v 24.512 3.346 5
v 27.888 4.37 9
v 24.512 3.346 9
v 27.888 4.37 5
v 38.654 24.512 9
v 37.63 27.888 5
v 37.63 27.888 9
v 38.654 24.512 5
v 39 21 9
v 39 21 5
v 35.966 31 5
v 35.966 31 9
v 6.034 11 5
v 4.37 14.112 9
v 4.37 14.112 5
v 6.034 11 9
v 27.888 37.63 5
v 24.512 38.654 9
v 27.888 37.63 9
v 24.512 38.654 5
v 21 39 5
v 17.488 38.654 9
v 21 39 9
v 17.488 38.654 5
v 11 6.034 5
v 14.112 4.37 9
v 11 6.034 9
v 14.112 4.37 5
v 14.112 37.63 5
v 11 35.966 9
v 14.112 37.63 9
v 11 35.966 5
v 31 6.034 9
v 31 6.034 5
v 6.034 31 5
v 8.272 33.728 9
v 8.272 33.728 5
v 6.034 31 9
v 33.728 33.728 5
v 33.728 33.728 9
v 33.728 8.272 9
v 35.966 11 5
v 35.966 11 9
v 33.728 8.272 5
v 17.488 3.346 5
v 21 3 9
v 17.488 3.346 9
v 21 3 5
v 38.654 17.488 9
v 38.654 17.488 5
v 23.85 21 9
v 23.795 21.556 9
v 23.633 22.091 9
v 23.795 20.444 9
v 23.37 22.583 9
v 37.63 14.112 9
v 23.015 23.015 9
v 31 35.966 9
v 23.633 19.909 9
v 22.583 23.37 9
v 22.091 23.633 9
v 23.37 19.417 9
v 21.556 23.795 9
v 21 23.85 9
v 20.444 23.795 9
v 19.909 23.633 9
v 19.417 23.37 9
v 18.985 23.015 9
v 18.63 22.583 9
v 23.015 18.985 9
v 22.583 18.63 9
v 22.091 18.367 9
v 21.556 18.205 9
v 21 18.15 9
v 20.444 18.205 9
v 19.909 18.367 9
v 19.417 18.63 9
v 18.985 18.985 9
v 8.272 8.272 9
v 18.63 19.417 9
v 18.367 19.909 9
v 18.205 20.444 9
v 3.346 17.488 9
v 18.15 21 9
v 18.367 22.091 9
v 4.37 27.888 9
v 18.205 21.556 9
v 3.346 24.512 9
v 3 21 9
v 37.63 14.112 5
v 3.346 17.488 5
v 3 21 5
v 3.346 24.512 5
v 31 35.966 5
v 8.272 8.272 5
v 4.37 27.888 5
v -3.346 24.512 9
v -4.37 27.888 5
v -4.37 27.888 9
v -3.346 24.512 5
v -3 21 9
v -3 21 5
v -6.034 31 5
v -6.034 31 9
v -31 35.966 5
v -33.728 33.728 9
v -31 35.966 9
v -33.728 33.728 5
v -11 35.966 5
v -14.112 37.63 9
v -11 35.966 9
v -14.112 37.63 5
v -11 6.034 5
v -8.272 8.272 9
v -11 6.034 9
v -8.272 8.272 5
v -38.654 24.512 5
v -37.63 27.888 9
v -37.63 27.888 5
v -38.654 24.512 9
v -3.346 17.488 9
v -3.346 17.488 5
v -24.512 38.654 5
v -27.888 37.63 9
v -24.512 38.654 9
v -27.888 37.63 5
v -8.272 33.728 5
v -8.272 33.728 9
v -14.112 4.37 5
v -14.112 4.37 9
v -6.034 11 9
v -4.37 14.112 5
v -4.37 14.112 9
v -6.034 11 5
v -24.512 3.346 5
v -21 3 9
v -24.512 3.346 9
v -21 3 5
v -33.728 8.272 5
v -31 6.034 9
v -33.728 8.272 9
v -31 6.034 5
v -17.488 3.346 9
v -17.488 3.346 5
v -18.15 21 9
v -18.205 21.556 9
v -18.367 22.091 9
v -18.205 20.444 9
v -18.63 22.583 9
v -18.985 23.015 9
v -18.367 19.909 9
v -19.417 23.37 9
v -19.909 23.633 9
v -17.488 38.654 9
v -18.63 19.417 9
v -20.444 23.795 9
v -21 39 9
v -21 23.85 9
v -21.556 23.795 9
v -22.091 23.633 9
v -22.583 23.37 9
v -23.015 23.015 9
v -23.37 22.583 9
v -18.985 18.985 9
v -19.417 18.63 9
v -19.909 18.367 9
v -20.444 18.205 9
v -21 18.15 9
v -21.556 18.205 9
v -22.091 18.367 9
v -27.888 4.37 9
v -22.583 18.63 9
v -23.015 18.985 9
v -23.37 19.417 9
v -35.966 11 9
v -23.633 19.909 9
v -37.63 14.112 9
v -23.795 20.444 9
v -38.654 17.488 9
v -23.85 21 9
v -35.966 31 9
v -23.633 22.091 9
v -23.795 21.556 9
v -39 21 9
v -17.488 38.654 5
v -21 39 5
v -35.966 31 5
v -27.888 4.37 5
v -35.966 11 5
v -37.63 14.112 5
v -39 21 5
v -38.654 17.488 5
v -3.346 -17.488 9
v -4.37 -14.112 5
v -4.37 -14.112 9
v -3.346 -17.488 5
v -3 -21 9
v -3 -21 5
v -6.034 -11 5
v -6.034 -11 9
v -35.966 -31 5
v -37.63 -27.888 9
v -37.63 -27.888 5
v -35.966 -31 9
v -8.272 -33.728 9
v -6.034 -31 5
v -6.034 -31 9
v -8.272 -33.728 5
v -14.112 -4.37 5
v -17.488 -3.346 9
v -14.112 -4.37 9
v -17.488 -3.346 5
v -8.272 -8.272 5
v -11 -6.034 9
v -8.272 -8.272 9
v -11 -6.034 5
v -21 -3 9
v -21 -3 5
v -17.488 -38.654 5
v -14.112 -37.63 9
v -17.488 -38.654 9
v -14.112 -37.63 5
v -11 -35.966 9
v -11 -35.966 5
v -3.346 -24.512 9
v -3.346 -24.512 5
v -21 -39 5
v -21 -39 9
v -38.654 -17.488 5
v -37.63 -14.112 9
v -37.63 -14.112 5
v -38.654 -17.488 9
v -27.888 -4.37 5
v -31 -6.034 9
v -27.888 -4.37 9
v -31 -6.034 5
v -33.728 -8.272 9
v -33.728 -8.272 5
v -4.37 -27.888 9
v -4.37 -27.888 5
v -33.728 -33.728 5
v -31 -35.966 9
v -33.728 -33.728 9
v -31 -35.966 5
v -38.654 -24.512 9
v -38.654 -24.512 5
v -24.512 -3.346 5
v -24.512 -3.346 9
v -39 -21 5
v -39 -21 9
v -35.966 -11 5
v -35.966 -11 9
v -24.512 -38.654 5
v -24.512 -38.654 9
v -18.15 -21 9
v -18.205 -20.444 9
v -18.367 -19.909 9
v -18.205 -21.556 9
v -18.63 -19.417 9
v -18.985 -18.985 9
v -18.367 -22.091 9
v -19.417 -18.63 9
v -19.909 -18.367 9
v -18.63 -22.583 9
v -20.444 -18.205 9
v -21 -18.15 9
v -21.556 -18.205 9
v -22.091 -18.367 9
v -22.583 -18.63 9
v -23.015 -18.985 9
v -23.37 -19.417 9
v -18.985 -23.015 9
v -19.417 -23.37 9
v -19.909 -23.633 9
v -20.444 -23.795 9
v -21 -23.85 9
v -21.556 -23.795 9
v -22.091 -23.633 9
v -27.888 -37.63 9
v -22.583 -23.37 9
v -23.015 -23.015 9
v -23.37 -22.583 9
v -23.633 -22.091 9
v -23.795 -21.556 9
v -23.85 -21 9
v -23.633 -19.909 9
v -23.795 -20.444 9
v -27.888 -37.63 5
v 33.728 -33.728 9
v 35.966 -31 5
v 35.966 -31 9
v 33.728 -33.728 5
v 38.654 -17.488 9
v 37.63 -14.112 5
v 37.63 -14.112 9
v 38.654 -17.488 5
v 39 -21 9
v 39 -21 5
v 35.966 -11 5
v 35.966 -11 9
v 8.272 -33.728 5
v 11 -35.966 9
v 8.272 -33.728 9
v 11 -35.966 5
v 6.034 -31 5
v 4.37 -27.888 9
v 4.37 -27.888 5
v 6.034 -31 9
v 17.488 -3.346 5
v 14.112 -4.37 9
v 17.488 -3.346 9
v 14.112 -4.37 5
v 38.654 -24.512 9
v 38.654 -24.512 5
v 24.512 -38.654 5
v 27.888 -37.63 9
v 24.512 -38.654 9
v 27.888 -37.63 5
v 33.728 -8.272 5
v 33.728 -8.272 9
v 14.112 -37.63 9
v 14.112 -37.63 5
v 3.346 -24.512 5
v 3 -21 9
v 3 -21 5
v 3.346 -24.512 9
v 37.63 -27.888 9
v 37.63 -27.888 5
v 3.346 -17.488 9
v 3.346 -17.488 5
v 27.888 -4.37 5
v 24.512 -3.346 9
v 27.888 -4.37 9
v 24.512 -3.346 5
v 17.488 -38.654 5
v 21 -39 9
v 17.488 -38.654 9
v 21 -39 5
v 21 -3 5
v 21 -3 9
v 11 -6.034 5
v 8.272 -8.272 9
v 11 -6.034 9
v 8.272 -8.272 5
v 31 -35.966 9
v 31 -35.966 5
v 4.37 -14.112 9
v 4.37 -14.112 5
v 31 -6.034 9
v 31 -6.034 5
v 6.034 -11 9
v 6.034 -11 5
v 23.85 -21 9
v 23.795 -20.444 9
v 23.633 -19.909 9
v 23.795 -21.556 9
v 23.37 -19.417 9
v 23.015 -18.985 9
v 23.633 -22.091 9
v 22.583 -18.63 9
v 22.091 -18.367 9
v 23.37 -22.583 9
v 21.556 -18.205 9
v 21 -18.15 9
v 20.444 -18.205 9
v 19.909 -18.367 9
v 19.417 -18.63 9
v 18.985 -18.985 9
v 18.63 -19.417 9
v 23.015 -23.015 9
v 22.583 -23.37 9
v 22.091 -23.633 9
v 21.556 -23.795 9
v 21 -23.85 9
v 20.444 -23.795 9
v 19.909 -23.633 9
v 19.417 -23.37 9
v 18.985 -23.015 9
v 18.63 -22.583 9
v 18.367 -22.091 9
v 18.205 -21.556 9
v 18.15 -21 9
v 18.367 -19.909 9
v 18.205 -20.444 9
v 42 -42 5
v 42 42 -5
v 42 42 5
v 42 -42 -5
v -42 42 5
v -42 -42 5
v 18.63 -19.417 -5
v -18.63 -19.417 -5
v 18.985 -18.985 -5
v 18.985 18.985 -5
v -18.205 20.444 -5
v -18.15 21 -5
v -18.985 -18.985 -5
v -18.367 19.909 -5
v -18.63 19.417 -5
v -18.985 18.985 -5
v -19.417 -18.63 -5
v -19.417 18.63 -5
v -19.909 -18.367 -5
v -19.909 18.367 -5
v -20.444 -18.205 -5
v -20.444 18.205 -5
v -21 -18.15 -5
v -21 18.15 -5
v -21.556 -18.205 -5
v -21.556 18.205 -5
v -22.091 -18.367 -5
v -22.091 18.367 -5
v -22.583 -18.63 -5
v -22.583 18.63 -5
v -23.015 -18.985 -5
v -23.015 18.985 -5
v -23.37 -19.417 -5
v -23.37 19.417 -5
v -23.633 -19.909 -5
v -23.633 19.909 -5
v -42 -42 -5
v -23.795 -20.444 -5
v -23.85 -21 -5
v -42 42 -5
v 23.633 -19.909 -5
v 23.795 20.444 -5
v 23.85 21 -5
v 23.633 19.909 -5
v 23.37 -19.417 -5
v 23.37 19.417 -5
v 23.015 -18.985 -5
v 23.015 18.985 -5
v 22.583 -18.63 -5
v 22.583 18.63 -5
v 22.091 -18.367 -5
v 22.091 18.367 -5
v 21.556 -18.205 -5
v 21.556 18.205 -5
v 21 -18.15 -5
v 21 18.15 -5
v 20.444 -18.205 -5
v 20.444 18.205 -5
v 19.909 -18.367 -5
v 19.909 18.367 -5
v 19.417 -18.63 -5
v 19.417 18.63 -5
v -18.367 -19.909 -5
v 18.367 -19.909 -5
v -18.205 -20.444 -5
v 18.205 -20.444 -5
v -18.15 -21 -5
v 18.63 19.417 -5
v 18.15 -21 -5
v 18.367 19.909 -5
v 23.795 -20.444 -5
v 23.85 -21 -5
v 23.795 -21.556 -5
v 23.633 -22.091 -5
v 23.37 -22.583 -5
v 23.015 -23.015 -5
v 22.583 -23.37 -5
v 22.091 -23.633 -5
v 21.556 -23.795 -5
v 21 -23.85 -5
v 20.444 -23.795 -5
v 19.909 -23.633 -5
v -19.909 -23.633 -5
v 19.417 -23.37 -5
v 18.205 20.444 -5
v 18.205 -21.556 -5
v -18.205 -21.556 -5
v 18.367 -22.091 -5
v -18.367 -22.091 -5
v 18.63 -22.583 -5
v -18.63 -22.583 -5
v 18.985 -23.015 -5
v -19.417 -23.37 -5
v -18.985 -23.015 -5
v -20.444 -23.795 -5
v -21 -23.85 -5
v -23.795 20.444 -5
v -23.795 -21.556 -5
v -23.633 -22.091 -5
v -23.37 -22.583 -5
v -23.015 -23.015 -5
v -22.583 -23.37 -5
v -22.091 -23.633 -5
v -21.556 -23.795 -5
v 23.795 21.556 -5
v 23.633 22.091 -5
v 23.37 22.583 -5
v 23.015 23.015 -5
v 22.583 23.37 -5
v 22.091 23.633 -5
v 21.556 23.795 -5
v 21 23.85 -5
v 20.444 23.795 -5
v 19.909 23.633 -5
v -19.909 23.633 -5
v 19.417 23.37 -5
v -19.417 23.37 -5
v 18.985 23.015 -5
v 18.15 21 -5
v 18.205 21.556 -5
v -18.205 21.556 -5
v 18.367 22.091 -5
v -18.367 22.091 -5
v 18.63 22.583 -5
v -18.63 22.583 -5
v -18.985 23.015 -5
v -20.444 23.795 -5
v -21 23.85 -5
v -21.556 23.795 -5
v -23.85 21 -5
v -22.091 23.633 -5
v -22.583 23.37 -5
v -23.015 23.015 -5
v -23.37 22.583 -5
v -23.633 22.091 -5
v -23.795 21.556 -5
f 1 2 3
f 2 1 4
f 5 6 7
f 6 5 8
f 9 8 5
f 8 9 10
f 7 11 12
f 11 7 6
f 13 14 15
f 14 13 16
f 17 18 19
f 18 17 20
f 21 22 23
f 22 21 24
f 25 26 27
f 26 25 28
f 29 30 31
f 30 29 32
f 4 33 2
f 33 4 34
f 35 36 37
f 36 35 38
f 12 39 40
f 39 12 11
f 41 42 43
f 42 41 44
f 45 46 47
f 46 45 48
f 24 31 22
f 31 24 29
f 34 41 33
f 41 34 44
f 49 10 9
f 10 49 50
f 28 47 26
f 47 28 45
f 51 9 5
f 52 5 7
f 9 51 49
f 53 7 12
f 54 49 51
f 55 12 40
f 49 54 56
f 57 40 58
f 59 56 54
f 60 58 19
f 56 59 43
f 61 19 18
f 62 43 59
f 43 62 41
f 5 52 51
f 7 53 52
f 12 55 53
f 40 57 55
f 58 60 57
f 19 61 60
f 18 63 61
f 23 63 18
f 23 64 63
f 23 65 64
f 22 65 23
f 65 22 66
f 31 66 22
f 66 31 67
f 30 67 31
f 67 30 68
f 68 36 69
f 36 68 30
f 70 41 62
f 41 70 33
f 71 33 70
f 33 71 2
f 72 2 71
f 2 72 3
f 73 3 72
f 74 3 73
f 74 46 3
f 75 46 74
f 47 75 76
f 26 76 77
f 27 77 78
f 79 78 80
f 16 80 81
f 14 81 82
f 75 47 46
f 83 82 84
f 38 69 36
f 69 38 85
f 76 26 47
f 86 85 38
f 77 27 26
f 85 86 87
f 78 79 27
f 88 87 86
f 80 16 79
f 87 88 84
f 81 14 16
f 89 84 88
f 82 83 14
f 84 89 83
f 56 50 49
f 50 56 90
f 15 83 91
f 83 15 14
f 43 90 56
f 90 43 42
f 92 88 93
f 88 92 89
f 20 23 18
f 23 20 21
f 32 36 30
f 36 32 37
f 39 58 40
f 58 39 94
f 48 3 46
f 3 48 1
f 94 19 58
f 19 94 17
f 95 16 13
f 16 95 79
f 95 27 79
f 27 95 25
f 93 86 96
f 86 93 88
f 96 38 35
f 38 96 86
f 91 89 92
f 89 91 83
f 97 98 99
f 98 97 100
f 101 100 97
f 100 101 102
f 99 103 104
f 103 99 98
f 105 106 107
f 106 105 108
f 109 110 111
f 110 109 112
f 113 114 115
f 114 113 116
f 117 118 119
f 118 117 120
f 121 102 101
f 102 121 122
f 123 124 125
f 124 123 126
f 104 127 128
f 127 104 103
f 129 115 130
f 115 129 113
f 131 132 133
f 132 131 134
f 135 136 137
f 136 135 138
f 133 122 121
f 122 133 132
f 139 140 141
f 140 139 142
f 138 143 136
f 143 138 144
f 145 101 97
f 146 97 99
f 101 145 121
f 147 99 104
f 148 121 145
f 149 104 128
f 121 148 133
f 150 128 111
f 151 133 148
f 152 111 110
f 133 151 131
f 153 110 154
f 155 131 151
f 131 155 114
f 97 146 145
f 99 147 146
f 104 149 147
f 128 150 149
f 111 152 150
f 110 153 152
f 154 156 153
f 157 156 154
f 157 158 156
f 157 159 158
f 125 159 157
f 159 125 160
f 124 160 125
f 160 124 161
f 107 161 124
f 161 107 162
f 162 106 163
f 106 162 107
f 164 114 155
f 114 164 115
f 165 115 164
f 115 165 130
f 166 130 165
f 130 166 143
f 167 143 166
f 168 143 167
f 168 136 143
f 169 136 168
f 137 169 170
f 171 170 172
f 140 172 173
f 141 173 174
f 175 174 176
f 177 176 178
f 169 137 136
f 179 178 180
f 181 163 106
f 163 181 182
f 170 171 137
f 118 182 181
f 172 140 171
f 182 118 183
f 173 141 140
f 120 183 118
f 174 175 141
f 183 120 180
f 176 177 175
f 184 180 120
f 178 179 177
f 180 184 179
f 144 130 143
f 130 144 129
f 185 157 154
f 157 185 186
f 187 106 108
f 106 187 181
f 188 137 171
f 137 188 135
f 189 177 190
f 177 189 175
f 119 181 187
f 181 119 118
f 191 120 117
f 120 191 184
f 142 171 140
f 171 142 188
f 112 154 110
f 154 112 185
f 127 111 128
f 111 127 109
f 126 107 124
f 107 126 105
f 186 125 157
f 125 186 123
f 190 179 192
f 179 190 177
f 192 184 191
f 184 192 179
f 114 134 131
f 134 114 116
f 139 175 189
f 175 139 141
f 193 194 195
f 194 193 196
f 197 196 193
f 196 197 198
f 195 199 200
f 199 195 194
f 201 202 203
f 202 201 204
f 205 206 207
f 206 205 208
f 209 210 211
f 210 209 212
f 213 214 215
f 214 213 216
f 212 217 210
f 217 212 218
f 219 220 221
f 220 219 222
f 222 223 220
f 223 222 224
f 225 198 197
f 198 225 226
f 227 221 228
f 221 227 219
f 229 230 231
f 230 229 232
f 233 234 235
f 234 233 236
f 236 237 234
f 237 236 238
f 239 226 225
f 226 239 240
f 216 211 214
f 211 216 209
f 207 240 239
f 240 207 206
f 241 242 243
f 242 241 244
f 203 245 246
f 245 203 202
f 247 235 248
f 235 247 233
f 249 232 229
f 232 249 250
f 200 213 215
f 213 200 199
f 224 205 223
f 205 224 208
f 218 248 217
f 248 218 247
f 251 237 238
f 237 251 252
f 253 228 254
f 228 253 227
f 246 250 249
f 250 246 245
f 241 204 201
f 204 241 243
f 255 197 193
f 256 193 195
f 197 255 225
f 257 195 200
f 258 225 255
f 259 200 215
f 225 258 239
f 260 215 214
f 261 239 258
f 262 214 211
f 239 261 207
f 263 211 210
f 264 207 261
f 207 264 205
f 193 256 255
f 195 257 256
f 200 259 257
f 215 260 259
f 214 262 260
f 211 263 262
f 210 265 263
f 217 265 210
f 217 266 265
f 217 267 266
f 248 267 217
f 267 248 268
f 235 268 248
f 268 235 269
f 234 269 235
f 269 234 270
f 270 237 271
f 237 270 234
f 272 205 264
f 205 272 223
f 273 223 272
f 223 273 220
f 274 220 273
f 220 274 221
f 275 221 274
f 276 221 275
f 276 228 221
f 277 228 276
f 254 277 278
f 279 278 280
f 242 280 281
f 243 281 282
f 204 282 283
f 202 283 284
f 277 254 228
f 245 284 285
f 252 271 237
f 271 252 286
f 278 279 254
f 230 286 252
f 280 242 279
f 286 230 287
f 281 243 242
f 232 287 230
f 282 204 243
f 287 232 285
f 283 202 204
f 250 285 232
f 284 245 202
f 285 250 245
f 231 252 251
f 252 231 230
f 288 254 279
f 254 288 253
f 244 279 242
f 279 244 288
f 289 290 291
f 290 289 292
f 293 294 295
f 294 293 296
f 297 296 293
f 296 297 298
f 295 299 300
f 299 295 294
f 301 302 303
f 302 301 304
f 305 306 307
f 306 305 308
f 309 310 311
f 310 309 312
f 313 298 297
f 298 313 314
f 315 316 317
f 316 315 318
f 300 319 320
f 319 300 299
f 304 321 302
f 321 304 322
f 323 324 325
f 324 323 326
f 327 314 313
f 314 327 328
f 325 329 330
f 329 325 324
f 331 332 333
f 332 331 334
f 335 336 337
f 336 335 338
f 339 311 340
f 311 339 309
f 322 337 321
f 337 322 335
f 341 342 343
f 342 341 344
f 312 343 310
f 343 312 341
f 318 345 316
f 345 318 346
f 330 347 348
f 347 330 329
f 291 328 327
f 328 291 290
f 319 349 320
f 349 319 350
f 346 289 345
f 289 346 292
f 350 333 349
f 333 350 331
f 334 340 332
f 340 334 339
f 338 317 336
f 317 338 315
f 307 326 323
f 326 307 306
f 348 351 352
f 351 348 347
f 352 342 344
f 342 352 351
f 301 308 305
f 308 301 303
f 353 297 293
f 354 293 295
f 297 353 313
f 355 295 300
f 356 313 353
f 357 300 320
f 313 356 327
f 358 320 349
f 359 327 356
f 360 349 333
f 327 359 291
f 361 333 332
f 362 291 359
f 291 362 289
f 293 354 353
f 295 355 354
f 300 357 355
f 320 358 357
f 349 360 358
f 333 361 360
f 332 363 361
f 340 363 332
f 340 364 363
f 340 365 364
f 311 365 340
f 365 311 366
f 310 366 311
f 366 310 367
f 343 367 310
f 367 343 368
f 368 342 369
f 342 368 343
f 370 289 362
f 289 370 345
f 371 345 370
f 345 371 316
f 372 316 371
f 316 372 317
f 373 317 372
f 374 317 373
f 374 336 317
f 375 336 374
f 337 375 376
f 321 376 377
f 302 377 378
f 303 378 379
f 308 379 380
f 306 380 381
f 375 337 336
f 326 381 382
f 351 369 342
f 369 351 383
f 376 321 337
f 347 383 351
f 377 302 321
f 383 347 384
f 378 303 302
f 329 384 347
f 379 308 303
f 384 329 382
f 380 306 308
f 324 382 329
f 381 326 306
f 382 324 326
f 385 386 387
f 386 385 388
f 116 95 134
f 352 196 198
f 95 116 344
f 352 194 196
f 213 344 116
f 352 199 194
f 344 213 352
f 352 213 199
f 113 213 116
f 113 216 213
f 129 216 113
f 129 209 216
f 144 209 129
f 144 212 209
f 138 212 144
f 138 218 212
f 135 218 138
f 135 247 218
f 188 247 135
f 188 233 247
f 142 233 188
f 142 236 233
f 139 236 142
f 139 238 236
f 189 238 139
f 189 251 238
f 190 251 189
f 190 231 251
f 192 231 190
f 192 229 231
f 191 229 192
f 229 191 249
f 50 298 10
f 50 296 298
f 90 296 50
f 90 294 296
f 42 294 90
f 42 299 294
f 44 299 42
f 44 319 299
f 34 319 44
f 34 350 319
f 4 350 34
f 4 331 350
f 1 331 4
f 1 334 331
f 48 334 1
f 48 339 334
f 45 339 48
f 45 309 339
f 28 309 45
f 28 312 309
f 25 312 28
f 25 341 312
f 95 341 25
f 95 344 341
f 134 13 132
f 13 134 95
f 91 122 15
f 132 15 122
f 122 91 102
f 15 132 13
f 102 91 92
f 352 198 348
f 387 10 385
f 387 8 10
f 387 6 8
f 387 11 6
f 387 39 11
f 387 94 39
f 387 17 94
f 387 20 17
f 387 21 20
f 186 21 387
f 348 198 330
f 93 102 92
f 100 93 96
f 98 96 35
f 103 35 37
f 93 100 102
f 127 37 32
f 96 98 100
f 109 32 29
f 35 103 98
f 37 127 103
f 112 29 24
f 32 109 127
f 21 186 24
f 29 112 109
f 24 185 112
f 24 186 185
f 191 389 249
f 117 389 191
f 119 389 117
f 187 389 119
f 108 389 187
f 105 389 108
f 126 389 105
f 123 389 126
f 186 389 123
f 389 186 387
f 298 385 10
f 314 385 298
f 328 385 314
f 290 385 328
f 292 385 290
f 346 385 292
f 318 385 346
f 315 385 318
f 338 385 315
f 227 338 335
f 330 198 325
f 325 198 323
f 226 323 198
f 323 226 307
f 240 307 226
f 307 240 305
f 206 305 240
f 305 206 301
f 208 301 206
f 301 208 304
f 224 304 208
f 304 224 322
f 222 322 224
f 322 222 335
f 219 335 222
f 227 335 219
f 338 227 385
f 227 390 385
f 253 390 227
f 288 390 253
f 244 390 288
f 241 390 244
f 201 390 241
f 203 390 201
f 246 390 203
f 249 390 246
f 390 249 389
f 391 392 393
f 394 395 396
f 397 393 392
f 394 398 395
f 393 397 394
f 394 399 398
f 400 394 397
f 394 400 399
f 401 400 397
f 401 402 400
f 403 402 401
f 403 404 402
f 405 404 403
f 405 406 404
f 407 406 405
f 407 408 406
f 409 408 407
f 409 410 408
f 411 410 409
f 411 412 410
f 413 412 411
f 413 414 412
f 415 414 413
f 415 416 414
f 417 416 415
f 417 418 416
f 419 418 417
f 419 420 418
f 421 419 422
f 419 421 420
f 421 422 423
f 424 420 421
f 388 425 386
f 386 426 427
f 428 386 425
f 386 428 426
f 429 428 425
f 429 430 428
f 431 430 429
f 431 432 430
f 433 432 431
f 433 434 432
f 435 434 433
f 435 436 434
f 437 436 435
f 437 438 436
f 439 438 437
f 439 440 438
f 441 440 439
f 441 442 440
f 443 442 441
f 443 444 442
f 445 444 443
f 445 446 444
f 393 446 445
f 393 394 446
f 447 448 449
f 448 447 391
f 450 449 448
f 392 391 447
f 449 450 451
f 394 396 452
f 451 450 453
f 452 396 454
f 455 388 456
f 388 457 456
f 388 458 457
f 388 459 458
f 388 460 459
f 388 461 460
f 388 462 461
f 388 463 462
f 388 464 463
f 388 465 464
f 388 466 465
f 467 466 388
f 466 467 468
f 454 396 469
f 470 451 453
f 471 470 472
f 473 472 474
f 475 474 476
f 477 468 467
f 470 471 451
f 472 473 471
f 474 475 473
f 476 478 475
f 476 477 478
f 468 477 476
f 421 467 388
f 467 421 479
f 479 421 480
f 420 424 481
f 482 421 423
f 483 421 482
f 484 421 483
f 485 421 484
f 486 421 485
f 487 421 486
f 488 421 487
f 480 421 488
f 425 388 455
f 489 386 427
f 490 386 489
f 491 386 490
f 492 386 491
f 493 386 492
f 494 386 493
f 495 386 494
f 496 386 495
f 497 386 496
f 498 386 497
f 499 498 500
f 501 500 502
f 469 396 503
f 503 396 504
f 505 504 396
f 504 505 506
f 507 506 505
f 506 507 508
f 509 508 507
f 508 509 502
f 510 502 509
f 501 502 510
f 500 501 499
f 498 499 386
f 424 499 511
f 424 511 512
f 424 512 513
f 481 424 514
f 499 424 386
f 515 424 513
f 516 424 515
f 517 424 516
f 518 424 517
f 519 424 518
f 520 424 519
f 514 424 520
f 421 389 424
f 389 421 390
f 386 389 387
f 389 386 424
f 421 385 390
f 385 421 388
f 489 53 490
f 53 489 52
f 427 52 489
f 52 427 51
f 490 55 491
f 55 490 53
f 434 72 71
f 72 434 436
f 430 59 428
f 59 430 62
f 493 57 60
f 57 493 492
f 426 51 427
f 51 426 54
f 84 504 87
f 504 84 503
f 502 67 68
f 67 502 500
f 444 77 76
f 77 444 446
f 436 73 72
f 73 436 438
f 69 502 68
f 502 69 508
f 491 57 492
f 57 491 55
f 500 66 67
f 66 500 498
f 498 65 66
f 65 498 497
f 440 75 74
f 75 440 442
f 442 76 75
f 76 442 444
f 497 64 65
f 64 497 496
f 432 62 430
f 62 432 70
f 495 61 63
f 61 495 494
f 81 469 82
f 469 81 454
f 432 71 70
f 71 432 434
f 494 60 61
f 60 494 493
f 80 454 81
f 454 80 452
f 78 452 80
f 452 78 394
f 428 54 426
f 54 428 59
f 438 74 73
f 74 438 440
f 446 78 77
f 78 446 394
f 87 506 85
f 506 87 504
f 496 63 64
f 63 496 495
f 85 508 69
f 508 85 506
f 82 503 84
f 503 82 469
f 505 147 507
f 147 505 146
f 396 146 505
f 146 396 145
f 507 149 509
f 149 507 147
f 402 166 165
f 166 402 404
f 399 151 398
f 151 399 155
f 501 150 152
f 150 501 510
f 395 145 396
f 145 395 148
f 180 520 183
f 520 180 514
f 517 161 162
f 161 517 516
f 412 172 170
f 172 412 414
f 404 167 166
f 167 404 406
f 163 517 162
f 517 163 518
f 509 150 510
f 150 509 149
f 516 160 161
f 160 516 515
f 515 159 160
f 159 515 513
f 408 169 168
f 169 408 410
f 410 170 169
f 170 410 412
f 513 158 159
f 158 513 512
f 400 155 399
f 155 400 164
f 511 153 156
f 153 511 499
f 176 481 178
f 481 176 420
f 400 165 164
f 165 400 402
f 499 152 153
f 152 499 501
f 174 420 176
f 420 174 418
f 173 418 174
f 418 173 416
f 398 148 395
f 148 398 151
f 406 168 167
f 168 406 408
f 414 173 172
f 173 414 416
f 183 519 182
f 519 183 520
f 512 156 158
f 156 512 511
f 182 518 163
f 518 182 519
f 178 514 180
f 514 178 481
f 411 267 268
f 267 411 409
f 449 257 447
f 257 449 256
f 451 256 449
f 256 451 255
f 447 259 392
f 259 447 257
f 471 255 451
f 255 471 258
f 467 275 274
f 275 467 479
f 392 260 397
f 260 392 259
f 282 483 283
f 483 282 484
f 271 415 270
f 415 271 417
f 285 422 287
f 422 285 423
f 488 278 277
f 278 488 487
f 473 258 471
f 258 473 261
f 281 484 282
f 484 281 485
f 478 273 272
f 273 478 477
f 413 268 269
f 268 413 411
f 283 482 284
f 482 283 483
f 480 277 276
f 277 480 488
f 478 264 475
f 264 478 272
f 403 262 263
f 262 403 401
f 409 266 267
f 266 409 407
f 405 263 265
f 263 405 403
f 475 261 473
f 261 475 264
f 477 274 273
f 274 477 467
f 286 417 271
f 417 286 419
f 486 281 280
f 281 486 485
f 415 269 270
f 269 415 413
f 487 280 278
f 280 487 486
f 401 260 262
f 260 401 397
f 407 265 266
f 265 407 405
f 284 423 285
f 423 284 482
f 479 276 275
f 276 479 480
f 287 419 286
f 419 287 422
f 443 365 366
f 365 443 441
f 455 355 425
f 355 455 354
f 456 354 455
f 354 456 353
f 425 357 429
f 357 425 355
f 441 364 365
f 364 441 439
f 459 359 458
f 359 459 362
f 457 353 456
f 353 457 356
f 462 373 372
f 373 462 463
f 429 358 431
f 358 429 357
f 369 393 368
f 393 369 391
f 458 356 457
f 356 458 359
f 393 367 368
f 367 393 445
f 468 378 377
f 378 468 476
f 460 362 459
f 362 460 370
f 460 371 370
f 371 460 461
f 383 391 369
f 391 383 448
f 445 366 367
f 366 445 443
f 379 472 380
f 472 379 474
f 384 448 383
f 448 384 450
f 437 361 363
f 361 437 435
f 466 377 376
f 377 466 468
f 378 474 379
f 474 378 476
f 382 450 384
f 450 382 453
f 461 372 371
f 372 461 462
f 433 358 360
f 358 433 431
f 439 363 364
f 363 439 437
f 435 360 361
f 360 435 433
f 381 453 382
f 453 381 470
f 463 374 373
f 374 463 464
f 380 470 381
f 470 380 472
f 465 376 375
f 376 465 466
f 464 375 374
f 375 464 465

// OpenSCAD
$fn = 32;

// ----------------------------------------------------------------------
// Anchor pads 84 x 84 x 14
// four corner bosses with anchor holes
// ----------------------------------------------------------------------

// --- parameters (mm) ---
plate = [84, 84, 10];   // base plate size (x, y, z)
pads = 4;               // boss count, one per corner
edge = 21;              // boss centre offset from the plate edge
boss_d = 36;            // boss diameter
boss_h = 4;             // boss height above the base plate
bore_d = 5.5;           // nominal hole diameter from the drawing
print_allowance = 0.2;  // clearance added for printing

// --- derived feature positions (mm) ---
hole_d = bore_d + print_allowance;  // = 5.7   hole diameter as printed
height = plate[2] + boss_h;         // = 14   overall height of the part
corner_x = plate[0] / 2 - edge;     // = 21   boss centre X
corner_y = plate[1] / 2 - edge;     // = 21   boss centre Y
feature_centers = [
  [corner_x, corner_y],
  [-corner_x, corner_y],
  [-corner_x, -corner_y],
  [corner_x, -corner_y]
];   // boss centres, anchor holes are drilled there

// base plate, four bosses standing on it, anchor holes all the way through
difference() {
  union() {
    cube(plate, center = true);
    for (centre = feature_centers)
      translate([centre[0], centre[1], plate[2] / 2 - 1])
        cylinder(d = boss_d, h = boss_h + 1);
  }
  for (centre = feature_centers)
    translate([centre[0], centre[1], -height])
      cylinder(d = hole_d, h = 2 * height + 2);  // through boss and plate
}
